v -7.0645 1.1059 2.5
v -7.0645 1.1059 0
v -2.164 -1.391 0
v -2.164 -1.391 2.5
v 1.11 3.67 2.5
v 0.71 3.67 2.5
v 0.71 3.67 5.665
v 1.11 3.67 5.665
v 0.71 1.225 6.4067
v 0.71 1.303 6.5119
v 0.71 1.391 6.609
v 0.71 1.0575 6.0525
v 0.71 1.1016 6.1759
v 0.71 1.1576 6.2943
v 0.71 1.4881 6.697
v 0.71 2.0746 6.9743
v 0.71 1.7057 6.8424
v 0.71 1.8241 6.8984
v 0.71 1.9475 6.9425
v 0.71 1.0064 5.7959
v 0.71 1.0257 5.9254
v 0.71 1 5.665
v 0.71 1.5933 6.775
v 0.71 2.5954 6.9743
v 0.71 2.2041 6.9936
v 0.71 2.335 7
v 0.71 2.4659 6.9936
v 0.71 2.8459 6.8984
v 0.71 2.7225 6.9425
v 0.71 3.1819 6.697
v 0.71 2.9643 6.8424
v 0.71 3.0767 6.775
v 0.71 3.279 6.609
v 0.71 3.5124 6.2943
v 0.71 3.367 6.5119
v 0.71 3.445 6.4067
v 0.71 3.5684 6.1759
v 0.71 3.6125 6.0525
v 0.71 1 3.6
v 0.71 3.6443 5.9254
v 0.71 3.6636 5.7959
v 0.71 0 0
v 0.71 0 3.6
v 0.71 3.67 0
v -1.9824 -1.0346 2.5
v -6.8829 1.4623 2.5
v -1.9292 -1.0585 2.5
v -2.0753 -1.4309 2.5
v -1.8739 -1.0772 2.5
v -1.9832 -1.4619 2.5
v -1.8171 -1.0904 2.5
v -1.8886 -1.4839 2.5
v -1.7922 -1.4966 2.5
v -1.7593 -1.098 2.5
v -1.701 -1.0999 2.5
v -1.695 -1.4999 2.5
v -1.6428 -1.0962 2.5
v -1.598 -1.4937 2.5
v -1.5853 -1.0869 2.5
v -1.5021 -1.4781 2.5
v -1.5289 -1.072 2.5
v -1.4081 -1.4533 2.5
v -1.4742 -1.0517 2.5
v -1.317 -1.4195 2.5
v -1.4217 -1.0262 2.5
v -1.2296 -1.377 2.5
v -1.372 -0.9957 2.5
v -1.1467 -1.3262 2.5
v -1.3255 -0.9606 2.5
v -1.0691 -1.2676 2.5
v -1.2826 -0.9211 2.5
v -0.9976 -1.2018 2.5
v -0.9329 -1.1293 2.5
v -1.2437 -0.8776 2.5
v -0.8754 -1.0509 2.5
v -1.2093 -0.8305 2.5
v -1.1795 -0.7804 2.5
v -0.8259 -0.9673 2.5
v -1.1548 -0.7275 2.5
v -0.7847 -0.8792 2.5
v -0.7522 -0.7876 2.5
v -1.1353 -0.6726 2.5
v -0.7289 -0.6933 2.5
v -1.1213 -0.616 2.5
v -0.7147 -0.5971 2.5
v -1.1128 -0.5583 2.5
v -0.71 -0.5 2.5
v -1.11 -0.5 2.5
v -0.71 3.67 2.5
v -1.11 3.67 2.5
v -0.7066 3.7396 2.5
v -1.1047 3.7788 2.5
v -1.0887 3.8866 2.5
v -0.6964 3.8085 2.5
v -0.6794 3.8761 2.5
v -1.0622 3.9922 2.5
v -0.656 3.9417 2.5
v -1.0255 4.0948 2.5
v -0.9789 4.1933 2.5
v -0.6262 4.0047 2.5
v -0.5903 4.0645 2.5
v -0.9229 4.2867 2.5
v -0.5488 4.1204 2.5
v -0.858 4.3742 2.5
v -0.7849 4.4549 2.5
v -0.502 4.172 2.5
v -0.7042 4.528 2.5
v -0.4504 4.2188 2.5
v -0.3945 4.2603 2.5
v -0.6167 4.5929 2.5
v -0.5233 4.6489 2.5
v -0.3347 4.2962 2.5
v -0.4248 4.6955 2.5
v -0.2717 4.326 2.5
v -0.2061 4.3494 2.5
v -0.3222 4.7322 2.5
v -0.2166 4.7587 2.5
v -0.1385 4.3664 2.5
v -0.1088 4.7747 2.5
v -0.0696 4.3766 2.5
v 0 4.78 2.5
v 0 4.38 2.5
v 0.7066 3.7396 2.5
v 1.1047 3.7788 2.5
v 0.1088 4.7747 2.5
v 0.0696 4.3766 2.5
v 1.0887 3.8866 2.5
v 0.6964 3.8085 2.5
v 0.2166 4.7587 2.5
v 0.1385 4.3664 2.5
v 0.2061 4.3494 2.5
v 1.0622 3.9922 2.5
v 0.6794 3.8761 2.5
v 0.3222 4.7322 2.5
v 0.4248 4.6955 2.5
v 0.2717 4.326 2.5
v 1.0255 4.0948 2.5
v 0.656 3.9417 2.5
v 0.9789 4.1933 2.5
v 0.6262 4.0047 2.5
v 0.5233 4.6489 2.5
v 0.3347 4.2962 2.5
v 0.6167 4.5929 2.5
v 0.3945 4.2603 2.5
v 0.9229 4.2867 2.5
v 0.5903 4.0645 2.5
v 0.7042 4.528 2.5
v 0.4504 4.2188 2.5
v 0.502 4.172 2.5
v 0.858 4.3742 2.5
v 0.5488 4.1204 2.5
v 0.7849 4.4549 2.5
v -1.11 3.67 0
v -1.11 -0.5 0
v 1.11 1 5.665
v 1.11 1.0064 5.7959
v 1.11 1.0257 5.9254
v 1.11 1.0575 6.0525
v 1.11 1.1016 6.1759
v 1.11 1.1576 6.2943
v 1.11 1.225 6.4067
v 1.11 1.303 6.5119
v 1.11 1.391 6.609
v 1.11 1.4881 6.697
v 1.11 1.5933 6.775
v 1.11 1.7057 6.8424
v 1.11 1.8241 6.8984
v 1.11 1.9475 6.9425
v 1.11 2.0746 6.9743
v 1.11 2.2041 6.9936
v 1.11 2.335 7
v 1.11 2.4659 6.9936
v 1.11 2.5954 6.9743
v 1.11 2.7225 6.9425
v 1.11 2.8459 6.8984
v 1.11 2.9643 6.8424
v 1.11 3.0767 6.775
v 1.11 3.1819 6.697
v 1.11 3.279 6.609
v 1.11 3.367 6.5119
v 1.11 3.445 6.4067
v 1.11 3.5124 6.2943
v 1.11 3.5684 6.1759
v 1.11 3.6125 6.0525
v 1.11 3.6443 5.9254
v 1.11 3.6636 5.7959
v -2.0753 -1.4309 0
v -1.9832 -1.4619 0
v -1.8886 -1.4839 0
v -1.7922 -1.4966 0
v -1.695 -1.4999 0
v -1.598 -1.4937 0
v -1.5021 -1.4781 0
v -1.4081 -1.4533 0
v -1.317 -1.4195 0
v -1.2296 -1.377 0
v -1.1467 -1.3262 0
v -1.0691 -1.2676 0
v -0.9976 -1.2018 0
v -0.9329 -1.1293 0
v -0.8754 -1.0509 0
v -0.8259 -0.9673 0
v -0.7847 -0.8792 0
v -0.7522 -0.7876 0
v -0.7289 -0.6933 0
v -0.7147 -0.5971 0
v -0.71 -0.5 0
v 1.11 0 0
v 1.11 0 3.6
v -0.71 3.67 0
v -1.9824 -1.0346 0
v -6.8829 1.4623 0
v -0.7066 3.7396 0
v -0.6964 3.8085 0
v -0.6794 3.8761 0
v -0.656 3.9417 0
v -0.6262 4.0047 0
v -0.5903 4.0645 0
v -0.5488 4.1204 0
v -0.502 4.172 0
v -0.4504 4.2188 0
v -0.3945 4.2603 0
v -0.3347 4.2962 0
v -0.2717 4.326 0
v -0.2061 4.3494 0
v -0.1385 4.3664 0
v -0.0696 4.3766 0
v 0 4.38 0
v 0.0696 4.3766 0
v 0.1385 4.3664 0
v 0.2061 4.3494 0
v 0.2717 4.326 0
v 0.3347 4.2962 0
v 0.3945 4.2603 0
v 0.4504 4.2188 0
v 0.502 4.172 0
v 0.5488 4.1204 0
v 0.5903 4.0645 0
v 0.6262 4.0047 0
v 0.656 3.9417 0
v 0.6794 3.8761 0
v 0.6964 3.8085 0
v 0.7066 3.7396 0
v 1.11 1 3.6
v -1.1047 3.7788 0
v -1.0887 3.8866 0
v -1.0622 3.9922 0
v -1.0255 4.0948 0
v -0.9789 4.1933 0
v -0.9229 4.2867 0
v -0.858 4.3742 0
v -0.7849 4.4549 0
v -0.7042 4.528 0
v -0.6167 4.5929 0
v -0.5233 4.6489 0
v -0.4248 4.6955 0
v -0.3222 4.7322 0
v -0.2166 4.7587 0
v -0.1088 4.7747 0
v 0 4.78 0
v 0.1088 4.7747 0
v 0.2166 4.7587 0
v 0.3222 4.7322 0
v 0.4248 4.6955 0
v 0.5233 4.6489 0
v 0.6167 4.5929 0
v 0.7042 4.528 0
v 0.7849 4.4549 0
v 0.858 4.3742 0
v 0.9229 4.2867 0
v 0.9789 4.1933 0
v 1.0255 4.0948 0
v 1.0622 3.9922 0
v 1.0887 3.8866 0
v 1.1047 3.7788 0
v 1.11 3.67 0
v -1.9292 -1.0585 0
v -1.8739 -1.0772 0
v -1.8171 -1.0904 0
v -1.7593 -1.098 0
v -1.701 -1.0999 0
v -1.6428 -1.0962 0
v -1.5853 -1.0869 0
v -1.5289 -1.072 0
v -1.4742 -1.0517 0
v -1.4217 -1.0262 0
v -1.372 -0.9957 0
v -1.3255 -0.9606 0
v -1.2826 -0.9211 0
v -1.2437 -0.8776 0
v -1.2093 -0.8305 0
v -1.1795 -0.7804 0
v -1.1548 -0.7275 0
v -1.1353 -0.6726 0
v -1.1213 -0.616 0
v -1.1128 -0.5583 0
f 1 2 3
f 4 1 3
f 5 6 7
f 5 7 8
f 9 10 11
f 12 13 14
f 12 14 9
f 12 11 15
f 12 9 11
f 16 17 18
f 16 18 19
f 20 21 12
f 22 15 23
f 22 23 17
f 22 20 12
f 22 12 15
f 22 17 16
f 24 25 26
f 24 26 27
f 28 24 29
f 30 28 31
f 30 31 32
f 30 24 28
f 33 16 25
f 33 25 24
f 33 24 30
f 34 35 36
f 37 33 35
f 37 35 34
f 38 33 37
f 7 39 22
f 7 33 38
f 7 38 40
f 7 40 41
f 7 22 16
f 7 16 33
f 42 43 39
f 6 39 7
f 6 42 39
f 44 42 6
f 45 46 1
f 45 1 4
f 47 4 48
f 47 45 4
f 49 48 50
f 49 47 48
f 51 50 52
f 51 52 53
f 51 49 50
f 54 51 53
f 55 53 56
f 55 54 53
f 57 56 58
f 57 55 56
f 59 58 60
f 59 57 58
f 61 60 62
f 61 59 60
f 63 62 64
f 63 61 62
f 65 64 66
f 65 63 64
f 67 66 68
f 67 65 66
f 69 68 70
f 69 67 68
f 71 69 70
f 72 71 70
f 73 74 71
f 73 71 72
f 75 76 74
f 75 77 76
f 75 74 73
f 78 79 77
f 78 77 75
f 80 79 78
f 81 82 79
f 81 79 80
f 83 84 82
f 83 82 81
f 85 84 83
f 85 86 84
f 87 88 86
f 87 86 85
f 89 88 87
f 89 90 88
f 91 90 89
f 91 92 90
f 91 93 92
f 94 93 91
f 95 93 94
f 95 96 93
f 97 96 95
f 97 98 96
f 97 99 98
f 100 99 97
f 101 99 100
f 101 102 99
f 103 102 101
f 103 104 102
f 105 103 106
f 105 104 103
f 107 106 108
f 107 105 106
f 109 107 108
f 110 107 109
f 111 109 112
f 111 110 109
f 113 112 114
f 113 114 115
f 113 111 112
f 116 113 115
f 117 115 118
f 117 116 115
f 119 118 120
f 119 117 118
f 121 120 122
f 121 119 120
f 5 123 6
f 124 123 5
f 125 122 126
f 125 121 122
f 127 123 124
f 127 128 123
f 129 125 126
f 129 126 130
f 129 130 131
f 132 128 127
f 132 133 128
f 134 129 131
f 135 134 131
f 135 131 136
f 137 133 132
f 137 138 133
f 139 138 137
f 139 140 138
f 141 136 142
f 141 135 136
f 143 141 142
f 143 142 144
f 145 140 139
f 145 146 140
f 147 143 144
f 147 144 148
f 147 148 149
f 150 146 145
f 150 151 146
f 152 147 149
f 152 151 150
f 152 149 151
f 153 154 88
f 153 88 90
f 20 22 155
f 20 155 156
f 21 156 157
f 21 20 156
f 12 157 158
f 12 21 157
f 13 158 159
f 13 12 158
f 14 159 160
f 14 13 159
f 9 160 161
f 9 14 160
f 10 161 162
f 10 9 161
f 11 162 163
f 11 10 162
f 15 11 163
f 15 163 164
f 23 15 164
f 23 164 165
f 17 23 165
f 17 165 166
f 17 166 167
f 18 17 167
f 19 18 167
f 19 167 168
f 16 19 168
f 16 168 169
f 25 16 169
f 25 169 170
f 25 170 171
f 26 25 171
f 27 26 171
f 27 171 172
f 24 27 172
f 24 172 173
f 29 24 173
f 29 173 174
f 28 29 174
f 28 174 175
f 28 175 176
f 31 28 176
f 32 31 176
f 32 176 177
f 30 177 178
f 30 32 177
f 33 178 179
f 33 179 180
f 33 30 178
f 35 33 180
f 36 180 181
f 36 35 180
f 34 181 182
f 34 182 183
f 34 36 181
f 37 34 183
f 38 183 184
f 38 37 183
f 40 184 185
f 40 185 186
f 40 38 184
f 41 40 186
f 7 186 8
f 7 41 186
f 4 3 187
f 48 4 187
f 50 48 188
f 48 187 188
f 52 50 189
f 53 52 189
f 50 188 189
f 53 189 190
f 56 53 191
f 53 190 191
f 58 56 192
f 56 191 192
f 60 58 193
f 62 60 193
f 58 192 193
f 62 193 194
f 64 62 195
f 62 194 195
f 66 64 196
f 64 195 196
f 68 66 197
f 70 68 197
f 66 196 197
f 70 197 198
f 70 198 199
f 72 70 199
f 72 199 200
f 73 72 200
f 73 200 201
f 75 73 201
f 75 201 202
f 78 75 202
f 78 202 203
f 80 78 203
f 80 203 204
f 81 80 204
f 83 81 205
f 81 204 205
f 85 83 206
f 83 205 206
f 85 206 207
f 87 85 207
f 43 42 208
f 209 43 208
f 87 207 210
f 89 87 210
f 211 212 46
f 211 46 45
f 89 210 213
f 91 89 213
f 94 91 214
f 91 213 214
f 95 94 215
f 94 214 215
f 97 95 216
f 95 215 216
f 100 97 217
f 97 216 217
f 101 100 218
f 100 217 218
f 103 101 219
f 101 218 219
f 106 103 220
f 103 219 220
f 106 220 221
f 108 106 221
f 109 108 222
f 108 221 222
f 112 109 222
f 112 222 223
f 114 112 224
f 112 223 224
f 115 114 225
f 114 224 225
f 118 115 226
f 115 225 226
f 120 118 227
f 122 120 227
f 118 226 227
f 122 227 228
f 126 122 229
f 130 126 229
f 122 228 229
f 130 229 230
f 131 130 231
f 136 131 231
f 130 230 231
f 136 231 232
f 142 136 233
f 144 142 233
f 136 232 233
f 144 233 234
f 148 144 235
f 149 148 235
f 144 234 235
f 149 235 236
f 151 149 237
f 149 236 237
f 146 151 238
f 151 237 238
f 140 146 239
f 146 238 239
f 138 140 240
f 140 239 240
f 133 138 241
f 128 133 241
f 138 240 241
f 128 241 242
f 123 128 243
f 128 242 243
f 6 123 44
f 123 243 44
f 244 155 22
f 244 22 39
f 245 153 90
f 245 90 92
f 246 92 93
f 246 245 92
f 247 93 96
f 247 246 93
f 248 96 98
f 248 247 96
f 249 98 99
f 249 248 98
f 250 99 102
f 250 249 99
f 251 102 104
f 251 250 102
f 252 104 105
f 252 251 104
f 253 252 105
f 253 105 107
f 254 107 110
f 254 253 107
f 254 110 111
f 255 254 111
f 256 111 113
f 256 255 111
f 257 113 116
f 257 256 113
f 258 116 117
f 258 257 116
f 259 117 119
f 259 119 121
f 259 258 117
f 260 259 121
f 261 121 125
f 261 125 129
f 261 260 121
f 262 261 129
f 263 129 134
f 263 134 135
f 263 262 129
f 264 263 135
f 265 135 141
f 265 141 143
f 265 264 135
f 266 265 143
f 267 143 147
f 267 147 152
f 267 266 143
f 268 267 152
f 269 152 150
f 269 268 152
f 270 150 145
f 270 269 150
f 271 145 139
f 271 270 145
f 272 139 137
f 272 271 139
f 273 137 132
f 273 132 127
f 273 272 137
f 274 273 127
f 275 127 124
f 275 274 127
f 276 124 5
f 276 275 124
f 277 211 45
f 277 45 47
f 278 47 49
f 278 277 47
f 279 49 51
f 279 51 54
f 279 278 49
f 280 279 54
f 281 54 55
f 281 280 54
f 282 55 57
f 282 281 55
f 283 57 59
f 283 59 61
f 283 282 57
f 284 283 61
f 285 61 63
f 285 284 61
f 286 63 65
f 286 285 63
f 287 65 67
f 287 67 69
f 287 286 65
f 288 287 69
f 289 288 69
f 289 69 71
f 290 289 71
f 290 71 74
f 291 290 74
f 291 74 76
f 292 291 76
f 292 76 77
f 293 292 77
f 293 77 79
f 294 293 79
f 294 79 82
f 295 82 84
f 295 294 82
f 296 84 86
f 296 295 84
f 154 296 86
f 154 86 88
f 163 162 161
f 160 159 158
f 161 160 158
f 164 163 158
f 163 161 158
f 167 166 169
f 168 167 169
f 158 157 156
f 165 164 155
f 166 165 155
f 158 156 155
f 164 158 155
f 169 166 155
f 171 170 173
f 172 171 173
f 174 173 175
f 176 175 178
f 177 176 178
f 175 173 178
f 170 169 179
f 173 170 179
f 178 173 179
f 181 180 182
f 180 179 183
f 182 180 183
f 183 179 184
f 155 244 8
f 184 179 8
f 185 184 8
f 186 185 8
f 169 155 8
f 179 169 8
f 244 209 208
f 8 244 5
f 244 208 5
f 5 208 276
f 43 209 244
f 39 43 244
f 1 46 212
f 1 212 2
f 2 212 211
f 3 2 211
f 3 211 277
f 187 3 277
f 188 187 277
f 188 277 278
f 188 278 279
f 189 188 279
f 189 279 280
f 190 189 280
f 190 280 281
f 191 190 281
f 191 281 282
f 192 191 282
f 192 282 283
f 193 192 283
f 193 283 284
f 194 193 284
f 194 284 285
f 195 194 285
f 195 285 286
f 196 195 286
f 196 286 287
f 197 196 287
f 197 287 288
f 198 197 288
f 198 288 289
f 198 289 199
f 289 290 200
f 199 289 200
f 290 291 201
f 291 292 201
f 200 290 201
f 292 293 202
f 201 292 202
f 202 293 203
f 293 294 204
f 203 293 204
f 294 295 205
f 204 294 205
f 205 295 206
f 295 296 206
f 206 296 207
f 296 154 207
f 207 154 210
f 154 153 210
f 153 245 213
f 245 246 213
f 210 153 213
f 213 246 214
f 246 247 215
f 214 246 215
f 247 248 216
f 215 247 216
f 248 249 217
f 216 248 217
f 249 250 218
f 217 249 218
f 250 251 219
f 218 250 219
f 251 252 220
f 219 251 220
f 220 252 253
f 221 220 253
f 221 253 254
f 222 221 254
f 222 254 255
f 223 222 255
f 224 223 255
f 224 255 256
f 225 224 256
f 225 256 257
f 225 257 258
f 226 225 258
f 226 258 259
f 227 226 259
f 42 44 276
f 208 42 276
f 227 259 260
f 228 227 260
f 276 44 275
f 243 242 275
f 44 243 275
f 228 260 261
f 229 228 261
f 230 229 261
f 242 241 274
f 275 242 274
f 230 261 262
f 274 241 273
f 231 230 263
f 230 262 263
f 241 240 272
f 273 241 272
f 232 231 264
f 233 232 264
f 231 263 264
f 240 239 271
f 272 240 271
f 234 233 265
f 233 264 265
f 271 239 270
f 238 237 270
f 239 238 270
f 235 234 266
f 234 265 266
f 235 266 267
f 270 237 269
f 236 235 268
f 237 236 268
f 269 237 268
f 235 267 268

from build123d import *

# Parameters (mm, degrees)
SURFACE_EXTRUDE1_1_DEPTH = 2.5
THICKEN1_T1              = 0.4
SKETCH2_W                = 0.4
SKETCH2_H                = 3.67
BOSS_EXTRUDE1_DEPTH      = 4.5
CUT_EXTRUDE1_REACH       = 13.776
SKETCH3_W                = 3.4
SKETCH3_H                = 1
FILLET2_RADIUS           = 1.335
FILLET2_LENGTH           = 0.4


with BuildPart() as body_1:
    # Surface-Extrude1: a surface, the sketch's curves swept straight by 2.5 mm
    with BuildLine(Plane.XY, mode=Mode.PRIVATE) as surface_extrude1_1_path:
        Line((-7.064526383, 1.105941224), (-2.1639905, -1.391006524))
        ThreePointArc((-2.1639905, -1.391006524), (-1.187501435, -1.352640164), (-0.71, -0.5))
        Line((-0.71, -0.5), (-0.71, 0))
        Line((-0.71, 0), (-0.71, 3.67))
        ThreePointArc((-0.71, 3.67), (0, 4.38), (0.71, 3.67))
        Line((0.71, 3.67), (0.71, 0))
    surface_extrude1_1 = Shell.extrude(surface_extrude1_1_path.wire(), (0 * SURFACE_EXTRUDE1_1_DEPTH, 0 * SURFACE_EXTRUDE1_1_DEPTH, 1 * SURFACE_EXTRUDE1_1_DEPTH))
    add(Solid.thicken(surface_extrude1_1, THICKEN1_T1))

    # Sketch2 → Boss-Extrude1 (add)
    with BuildSketch(Plane.XY.offset(2.5)):
        with Locations((0.91, 1.835)):
            Rectangle(SKETCH2_W, SKETCH2_H)
    extrude(amount=BOSS_EXTRUDE1_DEPTH)

    # Sketch3 → Cut-Extrude1 (cut, up to next)
    with BuildSketch(Plane(origin=(1.11, 0, 0), x_dir=(0, 0, -1), z_dir=(1, 0, 0)), mode=Mode.PRIVATE) as cut_extrude1_sk1:
        with Locations((-5.3, 0.5)):
            Rectangle(SKETCH3_W, SKETCH3_H)
    cut_extrude1_tool1 = extrude(cut_extrude1_sk1.sketch, amount=-CUT_EXTRUDE1_REACH, mode=Mode.PRIVATE) & body_1.part
    add(cut_extrude1_tool1.solids().sort_by_distance((1.11, 0.5, 5.3))[0], mode=Mode.SUBTRACT)

    # Fillet2: full round fillet: the end face becomes a half cylinder, R = half its width
    fillet2_face = Plane((0.91, 2.335, 7), x_dir=(-1, 0, 0), z_dir=(0, 0, 1))  # on the end face: x along it, z out of the body
    fillet2_slab = fillet2_face.offset(-FILLET2_RADIUS / 2) * Box(FILLET2_LENGTH, 2 * FILLET2_RADIUS, FILLET2_RADIUS, mode=Mode.PRIVATE)  # the body's end, R deep
    fillet2_round = Plane((0.91, 2.335, 5.665), x_dir=(0, 0, 1), z_dir=(-1, 0, 0)) * Cylinder(FILLET2_RADIUS, FILLET2_LENGTH, mode=Mode.PRIVATE)  # its axis R under the face
    add(fillet2_slab - fillet2_round, mode=Mode.SUBTRACT)


solid = body_1.part
